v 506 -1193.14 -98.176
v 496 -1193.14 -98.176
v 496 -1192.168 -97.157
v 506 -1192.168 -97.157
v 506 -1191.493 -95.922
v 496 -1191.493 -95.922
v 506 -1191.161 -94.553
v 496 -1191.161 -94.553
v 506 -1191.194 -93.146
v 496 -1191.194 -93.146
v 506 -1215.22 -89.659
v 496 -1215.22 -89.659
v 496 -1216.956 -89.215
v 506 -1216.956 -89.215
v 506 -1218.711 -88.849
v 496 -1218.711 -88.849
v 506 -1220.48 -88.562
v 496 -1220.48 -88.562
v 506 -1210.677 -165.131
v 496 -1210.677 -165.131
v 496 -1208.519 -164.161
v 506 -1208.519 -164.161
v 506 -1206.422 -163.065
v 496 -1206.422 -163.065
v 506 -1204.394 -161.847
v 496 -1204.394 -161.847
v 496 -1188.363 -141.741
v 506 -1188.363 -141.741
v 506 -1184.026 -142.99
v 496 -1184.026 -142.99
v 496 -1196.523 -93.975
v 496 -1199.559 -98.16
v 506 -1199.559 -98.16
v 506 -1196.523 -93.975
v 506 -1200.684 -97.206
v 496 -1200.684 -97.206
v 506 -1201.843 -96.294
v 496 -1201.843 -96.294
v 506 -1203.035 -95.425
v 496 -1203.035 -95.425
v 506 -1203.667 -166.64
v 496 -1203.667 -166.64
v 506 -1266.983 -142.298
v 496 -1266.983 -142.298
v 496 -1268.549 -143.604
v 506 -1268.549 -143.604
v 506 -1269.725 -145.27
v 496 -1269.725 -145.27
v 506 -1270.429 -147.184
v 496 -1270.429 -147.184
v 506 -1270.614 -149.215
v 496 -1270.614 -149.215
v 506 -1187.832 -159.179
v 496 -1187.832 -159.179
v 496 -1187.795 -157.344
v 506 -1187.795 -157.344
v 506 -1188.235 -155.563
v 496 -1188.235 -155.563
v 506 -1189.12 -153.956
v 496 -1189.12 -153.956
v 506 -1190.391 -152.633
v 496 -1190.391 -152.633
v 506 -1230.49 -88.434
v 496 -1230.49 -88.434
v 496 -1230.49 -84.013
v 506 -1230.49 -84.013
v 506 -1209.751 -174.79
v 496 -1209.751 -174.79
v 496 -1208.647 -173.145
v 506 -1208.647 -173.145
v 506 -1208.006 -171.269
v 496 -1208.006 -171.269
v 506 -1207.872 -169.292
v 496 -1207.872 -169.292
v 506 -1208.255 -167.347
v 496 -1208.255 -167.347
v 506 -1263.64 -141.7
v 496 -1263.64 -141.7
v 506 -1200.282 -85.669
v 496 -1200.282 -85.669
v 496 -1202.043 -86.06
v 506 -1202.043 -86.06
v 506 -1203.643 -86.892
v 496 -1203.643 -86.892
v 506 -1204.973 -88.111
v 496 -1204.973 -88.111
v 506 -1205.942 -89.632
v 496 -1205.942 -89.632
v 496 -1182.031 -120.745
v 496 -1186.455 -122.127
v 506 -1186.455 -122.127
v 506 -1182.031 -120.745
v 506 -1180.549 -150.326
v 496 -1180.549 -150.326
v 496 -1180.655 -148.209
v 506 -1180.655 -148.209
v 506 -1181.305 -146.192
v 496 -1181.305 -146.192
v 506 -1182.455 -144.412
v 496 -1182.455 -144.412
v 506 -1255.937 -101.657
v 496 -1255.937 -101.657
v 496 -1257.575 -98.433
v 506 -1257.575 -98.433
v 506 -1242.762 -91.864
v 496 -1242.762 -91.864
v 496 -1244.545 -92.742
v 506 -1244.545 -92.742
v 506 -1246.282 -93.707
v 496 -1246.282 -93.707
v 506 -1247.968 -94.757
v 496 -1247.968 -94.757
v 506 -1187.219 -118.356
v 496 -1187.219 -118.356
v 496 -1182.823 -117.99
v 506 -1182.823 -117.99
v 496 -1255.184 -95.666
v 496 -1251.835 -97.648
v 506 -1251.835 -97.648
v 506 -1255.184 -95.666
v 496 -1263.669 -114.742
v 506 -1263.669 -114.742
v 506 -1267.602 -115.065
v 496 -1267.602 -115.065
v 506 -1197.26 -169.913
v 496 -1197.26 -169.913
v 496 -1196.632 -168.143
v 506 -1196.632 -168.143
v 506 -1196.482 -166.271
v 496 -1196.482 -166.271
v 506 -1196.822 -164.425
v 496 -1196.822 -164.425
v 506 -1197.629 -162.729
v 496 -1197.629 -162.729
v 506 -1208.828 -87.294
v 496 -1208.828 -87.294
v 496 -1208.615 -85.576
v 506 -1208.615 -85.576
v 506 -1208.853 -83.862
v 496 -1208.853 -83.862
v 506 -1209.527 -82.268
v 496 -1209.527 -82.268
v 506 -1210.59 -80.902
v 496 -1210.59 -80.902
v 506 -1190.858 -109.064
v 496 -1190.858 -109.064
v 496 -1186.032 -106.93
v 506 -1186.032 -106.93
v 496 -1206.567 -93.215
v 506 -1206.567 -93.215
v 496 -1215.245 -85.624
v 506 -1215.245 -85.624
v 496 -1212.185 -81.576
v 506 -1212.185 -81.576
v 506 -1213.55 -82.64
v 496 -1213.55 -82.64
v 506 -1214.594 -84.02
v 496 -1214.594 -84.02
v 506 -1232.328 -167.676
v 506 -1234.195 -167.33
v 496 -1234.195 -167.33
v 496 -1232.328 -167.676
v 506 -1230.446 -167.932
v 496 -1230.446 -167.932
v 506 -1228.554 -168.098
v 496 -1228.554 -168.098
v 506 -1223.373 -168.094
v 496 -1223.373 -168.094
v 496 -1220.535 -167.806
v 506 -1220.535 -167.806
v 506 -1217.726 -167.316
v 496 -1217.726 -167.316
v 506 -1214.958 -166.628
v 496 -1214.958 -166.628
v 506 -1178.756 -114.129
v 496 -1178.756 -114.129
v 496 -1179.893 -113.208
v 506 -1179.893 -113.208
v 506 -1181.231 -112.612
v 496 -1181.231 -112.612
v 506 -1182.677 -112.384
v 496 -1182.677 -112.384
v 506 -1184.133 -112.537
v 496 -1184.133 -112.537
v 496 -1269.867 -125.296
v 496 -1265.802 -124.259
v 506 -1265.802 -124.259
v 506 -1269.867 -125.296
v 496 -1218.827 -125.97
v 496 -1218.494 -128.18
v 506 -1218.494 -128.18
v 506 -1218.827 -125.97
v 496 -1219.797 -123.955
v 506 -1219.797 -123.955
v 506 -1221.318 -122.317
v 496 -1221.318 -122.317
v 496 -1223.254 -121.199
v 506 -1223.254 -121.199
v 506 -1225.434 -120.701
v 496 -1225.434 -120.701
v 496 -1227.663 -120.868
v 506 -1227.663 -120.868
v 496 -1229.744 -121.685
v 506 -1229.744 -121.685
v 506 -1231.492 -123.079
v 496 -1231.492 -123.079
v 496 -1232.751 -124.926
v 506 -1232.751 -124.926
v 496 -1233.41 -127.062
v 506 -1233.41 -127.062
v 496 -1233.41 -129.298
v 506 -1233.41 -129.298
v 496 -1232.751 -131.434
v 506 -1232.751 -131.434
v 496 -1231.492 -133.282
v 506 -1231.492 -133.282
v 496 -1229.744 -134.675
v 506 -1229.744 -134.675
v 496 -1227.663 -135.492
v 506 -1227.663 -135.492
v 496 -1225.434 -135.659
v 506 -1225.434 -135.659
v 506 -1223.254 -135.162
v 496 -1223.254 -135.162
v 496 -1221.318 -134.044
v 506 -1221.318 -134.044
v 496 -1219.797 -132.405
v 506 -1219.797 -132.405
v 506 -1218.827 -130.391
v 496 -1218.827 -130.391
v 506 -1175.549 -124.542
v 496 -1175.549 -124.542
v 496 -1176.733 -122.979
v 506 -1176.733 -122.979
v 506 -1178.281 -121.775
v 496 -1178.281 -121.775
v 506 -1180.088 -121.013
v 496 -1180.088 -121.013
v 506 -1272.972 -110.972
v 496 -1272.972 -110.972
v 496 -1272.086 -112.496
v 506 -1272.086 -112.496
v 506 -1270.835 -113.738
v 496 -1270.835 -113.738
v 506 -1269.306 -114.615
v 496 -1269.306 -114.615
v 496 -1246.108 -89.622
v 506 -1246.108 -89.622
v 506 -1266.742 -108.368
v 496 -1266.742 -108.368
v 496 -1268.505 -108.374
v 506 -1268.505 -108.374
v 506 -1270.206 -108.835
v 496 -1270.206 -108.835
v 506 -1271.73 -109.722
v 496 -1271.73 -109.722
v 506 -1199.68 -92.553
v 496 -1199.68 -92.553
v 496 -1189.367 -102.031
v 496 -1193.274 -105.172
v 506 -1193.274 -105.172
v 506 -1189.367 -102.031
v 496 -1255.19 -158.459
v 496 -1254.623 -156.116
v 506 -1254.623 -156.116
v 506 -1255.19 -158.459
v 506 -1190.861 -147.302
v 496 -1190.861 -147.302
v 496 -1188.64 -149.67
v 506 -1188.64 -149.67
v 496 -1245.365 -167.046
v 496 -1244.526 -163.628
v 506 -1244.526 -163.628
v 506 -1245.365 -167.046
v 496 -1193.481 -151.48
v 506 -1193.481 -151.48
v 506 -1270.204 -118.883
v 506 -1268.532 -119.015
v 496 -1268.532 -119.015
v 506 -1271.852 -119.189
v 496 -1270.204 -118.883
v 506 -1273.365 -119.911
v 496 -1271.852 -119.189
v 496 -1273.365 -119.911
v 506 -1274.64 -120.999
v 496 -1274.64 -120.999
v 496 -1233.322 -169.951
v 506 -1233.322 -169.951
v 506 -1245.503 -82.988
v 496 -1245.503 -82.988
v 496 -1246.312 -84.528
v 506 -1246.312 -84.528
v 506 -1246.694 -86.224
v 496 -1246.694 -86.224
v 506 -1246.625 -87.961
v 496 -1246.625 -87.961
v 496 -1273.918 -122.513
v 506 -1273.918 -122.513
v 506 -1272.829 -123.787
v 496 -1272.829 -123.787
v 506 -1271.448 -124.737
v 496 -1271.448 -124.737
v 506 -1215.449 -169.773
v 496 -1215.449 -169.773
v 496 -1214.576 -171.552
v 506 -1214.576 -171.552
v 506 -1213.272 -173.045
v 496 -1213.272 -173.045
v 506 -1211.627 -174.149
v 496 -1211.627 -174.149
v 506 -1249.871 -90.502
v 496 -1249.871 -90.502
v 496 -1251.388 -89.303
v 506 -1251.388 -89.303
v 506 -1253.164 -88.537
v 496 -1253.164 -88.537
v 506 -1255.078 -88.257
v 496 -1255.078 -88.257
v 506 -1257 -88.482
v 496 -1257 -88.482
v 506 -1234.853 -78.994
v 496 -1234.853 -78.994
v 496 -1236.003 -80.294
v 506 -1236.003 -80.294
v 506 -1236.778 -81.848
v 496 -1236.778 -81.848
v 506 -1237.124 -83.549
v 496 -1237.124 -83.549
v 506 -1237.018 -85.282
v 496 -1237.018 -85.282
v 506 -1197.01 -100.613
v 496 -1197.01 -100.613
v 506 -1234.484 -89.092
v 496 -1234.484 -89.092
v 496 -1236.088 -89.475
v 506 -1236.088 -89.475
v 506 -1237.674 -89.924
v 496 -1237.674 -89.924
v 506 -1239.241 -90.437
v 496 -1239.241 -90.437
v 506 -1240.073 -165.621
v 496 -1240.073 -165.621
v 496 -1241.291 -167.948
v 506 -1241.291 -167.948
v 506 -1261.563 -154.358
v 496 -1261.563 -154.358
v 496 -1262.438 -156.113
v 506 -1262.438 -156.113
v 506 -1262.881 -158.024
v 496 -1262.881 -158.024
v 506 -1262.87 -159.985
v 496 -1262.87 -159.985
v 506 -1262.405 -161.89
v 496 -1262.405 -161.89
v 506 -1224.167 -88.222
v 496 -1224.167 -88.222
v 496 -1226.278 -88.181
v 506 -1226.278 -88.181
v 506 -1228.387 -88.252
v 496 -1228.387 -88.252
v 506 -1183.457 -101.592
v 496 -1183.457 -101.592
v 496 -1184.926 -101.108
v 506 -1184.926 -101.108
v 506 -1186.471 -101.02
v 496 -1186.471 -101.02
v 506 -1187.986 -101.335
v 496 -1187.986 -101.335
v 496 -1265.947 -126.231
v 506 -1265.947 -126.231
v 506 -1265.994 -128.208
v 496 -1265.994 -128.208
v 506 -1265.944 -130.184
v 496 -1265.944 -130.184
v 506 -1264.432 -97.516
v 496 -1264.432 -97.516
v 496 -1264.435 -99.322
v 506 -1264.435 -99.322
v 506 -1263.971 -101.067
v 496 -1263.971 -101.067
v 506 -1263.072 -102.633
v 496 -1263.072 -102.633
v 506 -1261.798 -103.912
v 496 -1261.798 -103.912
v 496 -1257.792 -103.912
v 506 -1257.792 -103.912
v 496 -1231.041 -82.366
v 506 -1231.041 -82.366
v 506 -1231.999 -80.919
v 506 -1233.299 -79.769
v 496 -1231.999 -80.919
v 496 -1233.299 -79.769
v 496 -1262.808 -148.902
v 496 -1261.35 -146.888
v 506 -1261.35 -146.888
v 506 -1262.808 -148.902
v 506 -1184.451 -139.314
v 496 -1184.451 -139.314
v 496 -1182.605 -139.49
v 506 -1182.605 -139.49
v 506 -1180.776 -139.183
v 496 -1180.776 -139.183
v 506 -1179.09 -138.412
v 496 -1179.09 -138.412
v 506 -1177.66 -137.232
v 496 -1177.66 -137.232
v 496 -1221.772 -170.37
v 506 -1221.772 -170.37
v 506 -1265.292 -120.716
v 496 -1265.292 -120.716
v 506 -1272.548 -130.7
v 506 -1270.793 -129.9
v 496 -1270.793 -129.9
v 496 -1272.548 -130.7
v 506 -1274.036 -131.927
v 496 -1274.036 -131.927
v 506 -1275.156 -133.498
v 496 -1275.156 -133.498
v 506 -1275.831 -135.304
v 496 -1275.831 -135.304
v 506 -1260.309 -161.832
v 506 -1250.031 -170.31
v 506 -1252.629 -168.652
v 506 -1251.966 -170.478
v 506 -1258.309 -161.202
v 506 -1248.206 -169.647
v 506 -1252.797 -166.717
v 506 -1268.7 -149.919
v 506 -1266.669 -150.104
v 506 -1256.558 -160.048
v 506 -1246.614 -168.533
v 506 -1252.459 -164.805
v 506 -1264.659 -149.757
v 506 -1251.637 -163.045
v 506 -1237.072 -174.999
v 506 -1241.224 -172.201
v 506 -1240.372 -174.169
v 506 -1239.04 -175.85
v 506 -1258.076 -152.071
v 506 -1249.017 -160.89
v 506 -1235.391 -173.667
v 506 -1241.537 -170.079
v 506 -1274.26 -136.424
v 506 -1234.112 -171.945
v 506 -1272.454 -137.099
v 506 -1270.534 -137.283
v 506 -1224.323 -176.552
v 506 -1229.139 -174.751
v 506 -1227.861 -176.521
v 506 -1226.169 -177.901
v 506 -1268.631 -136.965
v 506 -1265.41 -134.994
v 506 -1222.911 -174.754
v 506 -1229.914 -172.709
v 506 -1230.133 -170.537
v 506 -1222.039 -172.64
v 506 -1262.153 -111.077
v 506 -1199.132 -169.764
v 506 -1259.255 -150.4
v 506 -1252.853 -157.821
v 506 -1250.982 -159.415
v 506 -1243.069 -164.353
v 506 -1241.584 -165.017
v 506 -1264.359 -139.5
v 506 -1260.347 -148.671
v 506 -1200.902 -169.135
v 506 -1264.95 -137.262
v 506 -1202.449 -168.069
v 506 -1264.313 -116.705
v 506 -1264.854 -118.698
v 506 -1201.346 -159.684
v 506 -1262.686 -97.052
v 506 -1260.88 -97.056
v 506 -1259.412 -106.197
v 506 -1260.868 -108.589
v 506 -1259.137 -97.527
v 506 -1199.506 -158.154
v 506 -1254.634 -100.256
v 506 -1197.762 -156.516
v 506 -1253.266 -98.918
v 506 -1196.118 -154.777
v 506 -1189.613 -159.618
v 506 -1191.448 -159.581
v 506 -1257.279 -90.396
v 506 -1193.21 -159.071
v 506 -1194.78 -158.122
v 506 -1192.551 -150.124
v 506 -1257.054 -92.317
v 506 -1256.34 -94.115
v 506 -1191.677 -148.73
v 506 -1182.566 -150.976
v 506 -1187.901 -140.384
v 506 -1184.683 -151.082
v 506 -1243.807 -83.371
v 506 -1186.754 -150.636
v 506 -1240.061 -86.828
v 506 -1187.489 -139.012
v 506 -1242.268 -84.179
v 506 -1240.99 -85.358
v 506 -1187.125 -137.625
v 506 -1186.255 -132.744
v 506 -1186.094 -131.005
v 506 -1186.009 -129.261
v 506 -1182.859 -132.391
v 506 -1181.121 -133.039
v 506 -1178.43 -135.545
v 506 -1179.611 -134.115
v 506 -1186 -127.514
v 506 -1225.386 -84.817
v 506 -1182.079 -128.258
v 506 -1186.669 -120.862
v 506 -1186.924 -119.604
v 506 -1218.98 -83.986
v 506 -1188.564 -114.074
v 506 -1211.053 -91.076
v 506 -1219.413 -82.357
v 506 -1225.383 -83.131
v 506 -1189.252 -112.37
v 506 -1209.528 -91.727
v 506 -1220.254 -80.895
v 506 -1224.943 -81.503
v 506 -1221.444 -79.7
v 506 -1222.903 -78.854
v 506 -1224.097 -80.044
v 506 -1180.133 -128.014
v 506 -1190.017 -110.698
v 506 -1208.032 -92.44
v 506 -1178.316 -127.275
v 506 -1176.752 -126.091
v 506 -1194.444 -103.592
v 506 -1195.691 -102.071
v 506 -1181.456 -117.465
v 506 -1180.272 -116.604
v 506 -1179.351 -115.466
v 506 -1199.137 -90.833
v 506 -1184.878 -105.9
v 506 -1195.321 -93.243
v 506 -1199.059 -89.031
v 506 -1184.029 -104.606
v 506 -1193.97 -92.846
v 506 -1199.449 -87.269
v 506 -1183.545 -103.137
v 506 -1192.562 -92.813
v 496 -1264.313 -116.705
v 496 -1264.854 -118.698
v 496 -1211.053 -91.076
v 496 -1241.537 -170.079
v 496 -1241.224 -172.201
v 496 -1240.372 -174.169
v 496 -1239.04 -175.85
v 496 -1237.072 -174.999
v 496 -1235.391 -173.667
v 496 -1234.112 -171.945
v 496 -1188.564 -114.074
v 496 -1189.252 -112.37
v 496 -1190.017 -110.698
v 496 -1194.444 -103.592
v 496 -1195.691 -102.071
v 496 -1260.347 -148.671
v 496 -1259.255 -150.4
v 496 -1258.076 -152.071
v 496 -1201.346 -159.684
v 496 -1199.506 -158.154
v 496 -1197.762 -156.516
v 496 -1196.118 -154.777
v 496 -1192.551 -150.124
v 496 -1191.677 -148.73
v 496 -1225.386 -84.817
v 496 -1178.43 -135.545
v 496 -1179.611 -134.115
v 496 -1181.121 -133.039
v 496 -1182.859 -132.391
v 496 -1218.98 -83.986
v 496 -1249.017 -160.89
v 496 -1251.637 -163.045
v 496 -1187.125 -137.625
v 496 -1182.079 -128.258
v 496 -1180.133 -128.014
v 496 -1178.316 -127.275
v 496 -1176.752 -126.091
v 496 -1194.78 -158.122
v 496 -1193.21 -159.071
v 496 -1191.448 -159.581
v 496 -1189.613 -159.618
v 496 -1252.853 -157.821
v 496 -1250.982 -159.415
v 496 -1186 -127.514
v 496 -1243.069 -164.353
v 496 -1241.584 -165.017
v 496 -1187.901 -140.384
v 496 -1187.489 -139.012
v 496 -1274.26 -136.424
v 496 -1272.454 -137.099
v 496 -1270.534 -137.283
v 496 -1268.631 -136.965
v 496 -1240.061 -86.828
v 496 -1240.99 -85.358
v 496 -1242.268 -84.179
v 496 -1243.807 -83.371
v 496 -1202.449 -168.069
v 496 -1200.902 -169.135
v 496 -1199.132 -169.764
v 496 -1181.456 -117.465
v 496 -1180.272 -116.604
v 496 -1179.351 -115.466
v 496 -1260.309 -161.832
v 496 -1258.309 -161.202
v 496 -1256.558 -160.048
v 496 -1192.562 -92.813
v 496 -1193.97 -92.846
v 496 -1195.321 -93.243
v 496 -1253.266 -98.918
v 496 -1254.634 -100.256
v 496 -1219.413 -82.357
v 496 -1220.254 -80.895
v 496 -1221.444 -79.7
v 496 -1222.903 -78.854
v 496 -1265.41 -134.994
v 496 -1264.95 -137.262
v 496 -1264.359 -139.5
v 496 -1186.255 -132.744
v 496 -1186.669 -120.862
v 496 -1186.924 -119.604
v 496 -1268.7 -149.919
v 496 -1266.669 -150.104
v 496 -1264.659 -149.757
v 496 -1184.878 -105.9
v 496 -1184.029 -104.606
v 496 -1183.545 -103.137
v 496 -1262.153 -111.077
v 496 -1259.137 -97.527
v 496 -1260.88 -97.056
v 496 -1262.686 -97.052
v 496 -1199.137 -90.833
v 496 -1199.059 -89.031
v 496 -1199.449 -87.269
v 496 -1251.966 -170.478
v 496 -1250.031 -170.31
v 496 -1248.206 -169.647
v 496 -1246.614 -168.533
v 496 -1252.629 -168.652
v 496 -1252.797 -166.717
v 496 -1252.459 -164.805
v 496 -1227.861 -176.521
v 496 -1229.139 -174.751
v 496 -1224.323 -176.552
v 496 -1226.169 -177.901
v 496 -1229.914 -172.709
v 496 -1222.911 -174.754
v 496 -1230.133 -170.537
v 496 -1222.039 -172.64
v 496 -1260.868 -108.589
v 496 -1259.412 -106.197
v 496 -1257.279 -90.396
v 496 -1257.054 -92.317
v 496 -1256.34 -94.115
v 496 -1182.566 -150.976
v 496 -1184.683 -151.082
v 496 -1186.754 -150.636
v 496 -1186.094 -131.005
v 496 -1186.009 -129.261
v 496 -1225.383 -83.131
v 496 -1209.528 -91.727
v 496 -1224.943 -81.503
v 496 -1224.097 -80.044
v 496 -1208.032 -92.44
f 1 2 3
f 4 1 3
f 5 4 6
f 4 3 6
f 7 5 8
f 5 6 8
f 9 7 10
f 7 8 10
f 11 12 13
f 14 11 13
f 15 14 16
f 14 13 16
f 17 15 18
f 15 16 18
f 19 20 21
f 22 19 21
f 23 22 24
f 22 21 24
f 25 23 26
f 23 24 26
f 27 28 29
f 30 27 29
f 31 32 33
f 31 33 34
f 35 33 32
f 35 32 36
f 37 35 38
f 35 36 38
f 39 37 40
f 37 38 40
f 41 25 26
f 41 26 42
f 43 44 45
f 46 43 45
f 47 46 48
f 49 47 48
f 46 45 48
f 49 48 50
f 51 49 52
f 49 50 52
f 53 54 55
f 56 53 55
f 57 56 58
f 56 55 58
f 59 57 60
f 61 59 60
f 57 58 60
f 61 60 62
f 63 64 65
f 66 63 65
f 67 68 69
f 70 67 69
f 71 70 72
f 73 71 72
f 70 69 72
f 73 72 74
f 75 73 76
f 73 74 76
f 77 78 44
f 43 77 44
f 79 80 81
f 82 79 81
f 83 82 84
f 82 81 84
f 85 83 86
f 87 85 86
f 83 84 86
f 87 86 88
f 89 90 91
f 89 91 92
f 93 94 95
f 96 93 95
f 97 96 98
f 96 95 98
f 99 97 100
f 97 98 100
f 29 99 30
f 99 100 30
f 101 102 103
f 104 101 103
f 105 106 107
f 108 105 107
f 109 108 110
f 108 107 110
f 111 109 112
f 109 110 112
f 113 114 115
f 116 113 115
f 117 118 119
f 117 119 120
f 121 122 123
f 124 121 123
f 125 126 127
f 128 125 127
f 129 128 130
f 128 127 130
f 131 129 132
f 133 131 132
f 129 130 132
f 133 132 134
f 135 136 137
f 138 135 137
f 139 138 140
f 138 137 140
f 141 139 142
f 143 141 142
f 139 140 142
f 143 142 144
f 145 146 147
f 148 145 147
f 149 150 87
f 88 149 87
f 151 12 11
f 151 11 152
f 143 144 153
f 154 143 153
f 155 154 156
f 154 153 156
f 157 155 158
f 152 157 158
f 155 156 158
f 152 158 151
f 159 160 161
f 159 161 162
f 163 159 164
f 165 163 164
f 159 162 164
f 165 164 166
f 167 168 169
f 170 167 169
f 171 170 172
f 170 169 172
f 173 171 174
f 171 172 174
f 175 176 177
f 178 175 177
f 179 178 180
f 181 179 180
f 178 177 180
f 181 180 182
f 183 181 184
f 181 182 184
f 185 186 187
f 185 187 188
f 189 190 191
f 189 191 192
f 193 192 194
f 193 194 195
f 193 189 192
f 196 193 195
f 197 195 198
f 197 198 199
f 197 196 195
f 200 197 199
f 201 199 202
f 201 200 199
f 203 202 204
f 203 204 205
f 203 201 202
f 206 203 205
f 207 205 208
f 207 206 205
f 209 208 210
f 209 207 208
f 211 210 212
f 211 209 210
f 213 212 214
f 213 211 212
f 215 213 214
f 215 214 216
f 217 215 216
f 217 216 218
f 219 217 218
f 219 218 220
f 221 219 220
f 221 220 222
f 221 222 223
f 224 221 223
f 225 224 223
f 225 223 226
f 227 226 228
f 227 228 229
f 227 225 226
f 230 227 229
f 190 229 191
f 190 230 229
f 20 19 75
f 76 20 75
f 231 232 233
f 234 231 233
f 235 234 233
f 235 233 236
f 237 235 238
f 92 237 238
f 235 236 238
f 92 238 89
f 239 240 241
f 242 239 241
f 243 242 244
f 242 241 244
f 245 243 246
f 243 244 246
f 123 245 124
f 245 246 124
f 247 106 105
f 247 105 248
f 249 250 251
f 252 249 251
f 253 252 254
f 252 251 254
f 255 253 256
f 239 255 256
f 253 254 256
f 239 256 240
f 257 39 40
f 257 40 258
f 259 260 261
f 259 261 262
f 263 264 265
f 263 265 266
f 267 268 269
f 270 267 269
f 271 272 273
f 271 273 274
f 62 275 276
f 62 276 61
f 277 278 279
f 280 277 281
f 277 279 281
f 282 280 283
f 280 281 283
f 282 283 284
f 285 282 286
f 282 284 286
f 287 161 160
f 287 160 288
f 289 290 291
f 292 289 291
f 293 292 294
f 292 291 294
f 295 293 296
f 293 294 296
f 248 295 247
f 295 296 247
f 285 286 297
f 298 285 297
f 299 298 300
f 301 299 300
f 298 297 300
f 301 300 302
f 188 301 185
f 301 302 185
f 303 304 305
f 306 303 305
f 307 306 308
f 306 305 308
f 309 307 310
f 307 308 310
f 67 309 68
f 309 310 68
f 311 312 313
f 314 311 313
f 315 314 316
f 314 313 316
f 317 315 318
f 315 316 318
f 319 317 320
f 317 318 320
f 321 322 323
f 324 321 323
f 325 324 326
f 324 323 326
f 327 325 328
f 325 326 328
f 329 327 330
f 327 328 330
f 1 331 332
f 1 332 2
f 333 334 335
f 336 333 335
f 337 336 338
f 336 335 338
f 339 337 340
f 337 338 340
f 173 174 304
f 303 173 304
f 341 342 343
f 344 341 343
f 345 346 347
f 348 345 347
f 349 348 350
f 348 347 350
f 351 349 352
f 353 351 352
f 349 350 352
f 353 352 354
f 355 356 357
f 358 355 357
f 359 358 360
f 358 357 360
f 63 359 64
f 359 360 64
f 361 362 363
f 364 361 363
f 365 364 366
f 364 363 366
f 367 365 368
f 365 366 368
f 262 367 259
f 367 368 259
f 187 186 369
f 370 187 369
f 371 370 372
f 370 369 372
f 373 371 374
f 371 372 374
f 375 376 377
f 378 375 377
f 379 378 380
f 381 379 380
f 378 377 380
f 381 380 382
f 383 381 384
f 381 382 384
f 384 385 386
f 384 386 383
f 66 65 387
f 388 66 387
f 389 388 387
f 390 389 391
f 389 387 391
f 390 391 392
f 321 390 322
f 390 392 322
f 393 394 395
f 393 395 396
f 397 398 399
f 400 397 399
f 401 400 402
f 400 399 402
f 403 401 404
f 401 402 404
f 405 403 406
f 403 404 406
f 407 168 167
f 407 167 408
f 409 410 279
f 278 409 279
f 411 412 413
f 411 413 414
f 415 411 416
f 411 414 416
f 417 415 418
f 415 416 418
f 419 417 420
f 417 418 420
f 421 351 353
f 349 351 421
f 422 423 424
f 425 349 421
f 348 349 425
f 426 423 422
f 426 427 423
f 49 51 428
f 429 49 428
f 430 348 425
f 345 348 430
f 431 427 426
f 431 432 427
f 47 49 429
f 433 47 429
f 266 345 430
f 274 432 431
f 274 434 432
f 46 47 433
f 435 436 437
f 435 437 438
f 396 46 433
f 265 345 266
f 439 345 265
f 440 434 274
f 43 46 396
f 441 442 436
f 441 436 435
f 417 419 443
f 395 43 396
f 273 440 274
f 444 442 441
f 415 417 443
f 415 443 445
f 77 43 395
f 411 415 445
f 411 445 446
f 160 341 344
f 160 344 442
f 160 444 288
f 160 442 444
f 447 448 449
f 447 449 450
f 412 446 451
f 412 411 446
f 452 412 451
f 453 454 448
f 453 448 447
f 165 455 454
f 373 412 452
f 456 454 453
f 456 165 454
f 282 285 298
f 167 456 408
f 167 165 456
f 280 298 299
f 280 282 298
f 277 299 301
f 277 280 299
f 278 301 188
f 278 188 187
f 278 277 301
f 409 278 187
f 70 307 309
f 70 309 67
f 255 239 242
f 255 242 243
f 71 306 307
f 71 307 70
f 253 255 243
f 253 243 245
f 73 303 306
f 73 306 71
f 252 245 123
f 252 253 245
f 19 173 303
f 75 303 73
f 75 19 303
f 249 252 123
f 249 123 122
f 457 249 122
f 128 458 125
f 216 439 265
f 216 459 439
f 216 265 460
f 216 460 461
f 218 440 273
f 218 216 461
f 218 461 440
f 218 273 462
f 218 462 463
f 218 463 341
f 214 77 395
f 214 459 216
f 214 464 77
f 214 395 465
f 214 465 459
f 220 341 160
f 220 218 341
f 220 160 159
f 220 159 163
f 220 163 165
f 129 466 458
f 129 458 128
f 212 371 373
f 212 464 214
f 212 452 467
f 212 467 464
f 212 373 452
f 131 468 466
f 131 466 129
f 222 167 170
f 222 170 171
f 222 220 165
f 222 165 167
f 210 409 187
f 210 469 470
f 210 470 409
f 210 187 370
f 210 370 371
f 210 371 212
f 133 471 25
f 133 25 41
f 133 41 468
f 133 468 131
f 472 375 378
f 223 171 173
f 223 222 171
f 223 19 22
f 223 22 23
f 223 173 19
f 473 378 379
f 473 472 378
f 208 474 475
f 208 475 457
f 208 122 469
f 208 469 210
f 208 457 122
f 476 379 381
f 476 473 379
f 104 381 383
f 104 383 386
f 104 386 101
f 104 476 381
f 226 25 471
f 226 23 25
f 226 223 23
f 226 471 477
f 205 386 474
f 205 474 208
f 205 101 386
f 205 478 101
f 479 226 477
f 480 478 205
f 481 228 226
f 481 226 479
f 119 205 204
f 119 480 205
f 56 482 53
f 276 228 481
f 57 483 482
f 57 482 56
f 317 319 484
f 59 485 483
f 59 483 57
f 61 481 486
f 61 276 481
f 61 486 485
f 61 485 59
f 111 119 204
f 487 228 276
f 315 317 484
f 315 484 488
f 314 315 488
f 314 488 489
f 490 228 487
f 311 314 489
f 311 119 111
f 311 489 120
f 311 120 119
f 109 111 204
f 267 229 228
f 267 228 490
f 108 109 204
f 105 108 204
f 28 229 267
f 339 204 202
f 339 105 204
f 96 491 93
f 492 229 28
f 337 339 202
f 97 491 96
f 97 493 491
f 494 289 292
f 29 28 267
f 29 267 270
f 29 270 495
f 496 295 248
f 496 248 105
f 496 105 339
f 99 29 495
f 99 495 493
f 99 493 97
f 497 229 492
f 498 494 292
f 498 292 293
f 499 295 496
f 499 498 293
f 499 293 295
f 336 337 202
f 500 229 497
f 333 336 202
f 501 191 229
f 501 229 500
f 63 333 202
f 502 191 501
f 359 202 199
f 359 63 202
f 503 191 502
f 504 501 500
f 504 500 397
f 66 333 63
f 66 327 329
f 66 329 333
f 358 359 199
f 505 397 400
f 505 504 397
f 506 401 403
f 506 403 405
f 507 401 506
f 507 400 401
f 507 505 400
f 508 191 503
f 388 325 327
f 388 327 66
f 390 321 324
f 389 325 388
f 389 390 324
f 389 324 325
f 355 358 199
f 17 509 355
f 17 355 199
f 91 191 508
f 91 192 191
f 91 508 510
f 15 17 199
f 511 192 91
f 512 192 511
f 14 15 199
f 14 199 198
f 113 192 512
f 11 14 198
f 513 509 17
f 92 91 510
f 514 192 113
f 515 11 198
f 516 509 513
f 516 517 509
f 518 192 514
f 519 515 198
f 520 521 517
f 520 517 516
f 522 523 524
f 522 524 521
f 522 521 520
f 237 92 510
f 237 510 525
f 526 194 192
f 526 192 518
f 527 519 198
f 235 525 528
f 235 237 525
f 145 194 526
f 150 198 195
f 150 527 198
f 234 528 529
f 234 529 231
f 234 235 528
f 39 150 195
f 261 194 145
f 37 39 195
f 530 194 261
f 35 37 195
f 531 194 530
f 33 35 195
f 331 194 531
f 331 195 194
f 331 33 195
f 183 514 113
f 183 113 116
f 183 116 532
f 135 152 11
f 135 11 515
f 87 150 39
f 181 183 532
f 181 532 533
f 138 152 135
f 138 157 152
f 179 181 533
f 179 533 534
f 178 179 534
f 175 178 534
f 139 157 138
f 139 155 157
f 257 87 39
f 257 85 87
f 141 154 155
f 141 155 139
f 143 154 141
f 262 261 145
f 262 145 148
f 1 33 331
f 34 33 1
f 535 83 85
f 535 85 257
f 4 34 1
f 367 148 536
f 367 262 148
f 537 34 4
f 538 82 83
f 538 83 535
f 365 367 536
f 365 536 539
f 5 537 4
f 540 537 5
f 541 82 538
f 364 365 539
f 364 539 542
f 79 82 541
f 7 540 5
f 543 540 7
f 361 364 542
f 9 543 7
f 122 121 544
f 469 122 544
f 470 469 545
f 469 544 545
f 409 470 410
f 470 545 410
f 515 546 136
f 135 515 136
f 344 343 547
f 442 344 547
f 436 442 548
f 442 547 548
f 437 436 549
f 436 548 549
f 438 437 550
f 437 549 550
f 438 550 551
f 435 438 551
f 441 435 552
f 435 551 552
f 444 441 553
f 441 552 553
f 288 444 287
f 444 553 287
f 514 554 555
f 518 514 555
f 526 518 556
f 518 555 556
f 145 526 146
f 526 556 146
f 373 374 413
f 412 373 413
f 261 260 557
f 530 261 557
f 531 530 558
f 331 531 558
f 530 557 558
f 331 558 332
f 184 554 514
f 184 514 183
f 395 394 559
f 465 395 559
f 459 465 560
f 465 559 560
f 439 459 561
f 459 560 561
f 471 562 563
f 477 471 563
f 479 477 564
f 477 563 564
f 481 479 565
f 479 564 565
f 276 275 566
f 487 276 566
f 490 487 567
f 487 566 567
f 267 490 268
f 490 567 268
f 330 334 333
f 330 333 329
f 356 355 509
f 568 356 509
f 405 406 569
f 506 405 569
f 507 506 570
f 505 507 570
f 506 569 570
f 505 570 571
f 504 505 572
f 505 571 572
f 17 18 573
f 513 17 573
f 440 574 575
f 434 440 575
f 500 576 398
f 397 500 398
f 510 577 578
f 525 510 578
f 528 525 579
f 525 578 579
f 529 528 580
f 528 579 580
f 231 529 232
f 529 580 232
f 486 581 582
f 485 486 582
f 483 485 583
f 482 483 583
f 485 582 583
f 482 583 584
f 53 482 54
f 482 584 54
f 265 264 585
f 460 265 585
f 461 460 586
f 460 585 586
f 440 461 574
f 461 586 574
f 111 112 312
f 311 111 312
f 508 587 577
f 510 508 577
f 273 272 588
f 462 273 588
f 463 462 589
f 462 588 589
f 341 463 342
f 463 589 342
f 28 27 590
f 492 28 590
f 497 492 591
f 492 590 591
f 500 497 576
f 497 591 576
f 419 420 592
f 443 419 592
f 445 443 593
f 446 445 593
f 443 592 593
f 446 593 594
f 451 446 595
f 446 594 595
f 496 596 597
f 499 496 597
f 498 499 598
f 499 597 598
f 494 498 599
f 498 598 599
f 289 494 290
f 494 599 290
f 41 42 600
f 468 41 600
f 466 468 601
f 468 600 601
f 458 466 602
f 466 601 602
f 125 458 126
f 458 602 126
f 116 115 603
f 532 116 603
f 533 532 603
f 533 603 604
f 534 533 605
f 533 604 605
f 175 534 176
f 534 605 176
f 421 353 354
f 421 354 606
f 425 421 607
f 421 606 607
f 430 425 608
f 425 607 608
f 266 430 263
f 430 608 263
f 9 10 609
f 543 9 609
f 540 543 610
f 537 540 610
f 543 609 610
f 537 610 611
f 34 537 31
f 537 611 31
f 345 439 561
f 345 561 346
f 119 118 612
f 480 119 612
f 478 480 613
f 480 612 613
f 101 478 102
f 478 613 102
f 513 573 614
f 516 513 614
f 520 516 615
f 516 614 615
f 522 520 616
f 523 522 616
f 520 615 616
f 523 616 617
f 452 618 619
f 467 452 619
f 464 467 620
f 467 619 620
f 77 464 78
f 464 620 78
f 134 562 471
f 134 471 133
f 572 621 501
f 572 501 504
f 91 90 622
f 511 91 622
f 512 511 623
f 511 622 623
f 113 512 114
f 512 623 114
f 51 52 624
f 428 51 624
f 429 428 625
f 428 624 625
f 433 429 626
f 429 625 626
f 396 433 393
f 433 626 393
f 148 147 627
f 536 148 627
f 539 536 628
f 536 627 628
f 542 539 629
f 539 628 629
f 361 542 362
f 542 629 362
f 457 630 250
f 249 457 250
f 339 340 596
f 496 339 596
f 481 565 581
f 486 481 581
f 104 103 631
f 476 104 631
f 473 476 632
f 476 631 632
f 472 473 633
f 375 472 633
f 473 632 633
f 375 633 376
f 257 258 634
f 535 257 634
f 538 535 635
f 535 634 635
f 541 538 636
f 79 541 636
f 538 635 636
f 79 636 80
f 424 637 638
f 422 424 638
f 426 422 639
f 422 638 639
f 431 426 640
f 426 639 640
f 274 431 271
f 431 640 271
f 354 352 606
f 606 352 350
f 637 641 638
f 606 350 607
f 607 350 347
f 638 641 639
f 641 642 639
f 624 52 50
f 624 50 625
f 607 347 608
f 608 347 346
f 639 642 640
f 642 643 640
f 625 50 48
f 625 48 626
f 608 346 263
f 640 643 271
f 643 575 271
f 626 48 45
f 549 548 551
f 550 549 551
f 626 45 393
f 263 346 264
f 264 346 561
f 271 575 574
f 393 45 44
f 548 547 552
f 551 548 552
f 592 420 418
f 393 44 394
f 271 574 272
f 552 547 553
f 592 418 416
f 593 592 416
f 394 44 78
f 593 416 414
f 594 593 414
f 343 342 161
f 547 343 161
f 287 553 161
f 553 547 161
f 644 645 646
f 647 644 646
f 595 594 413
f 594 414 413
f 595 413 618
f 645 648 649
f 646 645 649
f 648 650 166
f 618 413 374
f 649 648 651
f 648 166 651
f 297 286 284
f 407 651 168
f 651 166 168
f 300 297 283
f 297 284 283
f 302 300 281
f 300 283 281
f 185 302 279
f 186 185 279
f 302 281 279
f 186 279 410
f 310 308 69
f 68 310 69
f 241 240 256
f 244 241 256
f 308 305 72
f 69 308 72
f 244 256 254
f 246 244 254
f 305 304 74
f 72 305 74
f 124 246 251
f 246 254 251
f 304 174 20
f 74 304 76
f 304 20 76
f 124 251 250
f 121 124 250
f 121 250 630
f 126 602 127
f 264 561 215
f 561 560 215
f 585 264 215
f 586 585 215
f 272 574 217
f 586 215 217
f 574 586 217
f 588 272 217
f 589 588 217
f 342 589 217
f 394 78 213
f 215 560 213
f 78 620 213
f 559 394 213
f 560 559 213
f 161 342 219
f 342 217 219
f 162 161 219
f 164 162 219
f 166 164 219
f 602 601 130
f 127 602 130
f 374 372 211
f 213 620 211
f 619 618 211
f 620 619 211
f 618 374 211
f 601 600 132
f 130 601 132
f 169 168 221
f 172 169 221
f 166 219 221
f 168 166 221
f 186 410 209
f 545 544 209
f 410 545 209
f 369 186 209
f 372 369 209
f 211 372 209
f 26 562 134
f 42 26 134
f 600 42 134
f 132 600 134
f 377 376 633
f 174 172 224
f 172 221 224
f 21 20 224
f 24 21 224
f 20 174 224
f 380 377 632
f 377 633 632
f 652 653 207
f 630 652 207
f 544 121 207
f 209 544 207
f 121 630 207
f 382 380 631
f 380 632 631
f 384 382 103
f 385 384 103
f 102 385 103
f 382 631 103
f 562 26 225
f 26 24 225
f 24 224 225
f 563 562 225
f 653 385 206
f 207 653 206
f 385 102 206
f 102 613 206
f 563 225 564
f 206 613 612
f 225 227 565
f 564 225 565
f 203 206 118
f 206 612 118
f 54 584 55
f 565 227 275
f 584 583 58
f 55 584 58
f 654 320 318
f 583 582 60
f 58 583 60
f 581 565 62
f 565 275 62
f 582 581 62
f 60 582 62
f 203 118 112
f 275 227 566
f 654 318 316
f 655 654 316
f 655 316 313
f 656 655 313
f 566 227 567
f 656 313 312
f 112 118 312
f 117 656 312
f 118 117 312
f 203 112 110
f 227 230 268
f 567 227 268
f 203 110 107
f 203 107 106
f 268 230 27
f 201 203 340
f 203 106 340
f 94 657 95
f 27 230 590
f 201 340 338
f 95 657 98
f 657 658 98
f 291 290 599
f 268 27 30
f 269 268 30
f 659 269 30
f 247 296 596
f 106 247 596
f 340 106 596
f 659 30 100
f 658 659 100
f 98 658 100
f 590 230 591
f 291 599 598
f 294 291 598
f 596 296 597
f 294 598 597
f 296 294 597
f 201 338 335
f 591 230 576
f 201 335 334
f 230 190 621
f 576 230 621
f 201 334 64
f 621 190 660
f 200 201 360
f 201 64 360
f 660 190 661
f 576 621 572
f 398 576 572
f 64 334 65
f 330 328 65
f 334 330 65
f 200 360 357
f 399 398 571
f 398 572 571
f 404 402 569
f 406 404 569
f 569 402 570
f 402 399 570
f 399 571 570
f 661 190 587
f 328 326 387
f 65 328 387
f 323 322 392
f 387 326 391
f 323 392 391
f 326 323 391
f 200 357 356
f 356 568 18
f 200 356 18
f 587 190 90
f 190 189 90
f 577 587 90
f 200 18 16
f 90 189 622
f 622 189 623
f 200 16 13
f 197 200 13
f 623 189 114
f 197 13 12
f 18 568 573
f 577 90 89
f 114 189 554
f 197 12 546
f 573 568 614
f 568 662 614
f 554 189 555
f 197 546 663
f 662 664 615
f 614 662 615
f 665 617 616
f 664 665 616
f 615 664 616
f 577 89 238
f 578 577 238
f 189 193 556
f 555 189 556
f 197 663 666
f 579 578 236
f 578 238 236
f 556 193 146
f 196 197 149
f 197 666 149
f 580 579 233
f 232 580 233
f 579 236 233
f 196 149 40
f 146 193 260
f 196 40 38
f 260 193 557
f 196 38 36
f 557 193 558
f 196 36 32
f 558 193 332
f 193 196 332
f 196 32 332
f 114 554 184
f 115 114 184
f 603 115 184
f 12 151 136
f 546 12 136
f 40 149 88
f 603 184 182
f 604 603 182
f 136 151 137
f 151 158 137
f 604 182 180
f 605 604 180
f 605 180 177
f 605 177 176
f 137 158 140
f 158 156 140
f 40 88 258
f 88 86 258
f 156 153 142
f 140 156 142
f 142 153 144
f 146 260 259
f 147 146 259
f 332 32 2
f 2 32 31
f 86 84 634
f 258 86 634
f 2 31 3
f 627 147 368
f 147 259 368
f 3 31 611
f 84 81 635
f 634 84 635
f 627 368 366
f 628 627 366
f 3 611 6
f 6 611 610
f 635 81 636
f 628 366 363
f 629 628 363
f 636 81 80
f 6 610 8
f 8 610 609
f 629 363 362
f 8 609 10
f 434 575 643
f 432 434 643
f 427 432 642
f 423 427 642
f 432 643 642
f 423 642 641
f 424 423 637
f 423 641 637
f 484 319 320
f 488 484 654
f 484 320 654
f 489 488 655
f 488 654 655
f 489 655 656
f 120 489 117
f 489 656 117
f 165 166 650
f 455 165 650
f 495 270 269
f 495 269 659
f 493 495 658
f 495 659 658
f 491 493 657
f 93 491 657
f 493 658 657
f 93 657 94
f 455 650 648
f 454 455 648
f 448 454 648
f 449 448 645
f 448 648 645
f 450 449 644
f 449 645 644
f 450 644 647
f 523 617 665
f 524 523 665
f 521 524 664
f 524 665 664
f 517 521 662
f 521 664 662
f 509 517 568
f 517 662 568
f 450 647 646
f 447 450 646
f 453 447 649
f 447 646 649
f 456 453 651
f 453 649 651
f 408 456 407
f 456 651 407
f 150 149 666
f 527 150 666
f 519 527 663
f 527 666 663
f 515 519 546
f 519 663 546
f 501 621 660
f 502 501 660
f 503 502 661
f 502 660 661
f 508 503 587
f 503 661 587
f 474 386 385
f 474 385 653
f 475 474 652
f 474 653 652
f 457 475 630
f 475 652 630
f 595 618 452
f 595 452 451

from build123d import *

# Parameters (mm, degrees)
SKETCH002_R  = 7.5
PAD001_DEPTH = 10


with BuildPart() as part:
    # Sketch002 → Pad001 (new body)
    with BuildSketch(Plane.YZ):
        with BuildLine():
            ThreePointArc((-7.372881, -40.094264), (-3.126041, -39.586192), (1.04227, -38.627568))
            Line((1.04227, -38.627568), (0.551182, -41.772804))
            ThreePointArc((0.551182, -41.772804), (2.72771, -45.044909), (6.248691, -46.790371))
            ThreePointArc((6.248691, -46.790371), (7.994153, -43.26939), (7.745277, -39.3474))
            Line((5.322974, -37.131356), (7.745277, -39.3474))
            ThreePointArc((5.322974, -37.131356), (8.537274, -35.628587), (11.605754, -33.846883))
            Line((11.605754, -33.846883), (12.333348, -38.63991))
            ThreePointArc((12.333348, -38.63991), (15.097939, -41.134767), (18.739574, -41.913081))
            ThreePointArc((18.739574, -41.913081), (19.517888, -38.271446), (18.37111, -34.728541))
            Line((14.654104, -31.683604), (18.37111, -34.728541))
            ThreePointArc((14.654104, -31.683604), (17.378229, -29.347876), (19.882066, -26.777412))
            Line((19.882066, -26.777412), (21.219608, -30.122295))
            ThreePointArc((21.219608, -30.122295), (24.552318, -31.581454), (28.168109, -31.178768))
            ThreePointArc((28.168109, -31.178768), (27.765423, -27.562977), (25.608791, -24.632953))
            Line((22.518982, -23.480322), (25.608791, -24.632953))
            ThreePointArc((22.518982, -23.480322), (23.893543, -21.431633), (25.139192, -19.302101))
            Line((25.139192, -19.302101), (27.359533, -21.66958))
            ThreePointArc((27.359533, -21.66958), (31.317426, -23.081877), (35.451211, -22.326017))
            ThreePointArc((35.451211, -22.326017), (34.69535, -18.192232), (31.973863, -14.9902))
            Line((27.63708, -13.740754), (31.973863, -14.9902))
            ThreePointArc((27.63708, -13.740754), (28.311222, -11.699588), (28.874738, -9.625154))
            Line((28.874738, -9.625154), (31.548764, -11.314179))
            ThreePointArc((31.548764, -11.314179), (35.22362, -11.182883), (38.340491, -9.231748))
            ThreePointArc((38.340491, -9.231748), (36.389357, -6.114877), (33.141189, -4.391155))
            Line((29.744589, -4.744157), (33.141189, -4.391155))
            ThreePointArc((29.744589, -4.744157), (29.958098, -2.133322), (30.00026, 0.485889))
            Line((30.00026, 0.485889), (33.921496, -0.257635))
            ThreePointArc((33.921496, -0.257635), (37.68409, 0.725166), (40.451192, 3.457594))
            ThreePointArc((40.451192, 3.457594), (37.718763, 6.224696), (33.968861, 7.254862))
            Line((29.545098, 5.873223), (33.968861, 7.254862))
            ThreePointArc((29.545098, 5.873223), (29.208197, 7.767875), (28.780562, 9.644132))
            Line((28.780562, 9.644132), (33.177289, 10.00993))
            ThreePointArc((33.177289, 10.00993), (35.728214, 11.395702), (37.244494, 13.871278))
            ThreePointArc((37.244494, 13.871278), (34.768918, 15.387558), (31.866866, 15.462907))
            Line((27.436049, 13.925673), (31.866866, 15.462907))
            ThreePointArc((27.436049, 13.925673), (26.375433, 16.470589), (25.142027, 18.936397))
            Line((25.142027, 18.936397), (29.967849, 21.069522))
            ThreePointArc((29.967849, 21.069522), (31.970773, 23.393509), (32.543362, 26.407602))
            ThreePointArc((32.543362, 26.407602), (29.529269, 26.980191), (26.632693, 25.969022))
            Line((22.726486, 22.827517), (26.632693, 25.969022))
            ThreePointArc((22.726486, 22.827517), (20.942152, 25.176066), (18.98961, 27.386747))
            Line((18.98961, 27.386747), (22.859671, 29.824034))
            ThreePointArc((22.859671, 29.824034), (24.506903, 32.07831), (24.80631, 34.854187))
            ThreePointArc((24.80631, 34.854187), (22.030434, 35.153594), (19.476751, 34.02495))
            Line((16.440698, 29.839688), (19.476751, 34.02495))
            ThreePointArc((16.440698, 29.839688), (14.740616, 31.25523), (12.964876, 32.574618))
            Line((12.964876, 32.574618), (16.319999, 35.447081))
            ThreePointArc((16.319999, 35.447081), (16.941471, 38.969468), (15.718489, 42.330681))
            ThreePointArc((15.718489, 42.330681), (12.357276, 41.107698), (10.057871, 38.367958))
            Line((9.433448, 34.784975), (10.057871, 38.367958))
            ThreePointArc((9.433448, 34.784975), (7.223624, 35.924417), (4.947279, 36.924367))
            Line((4.947279, 36.924367), (7.1719, 40.70615))
            ThreePointArc((7.1719, 40.70615), (7.147067, 44.138089), (5.409592, 47.097818))
            ThreePointArc((5.409592, 47.097818), (2.449862, 45.360343), (0.755399, 42.37578))
            Line((0.780338, 38.341298), (0.755399, 42.37578))
            ThreePointArc((0.780338, 38.341298), (-1.831547, 38.978037), (-4.480302, 39.437893))
            Line((-4.480302, 39.437893), (-2.979924, 44.013792))
            ThreePointArc((-2.979924, 44.013792), (-4.253731, 47.105339), (-6.902654, 49.145794))
            ThreePointArc((-6.902654, 49.145794), (-8.943109, 46.496871), (-9.385733, 43.182609))
            Line((-8.16746, 39.778019), (-9.385733, 43.182609))
            ThreePointArc((-8.16746, 39.778019), (-11.333059, 39.797339), (-14.490272, 39.566265))
            Line((-14.490272, 39.566265), (-14.490272, 43.98748))
            ThreePointArc((-14.490272, 43.98748), (-15.999307, 47.081093), (-18.852977, 49.005722))
            ThreePointArc((-18.852977, 49.005722), (-20.777606, 46.152053), (-21.01755, 42.718388))
            Line((-18.483952, 38.908421), (-21.01755, 42.718388))
            ThreePointArc((-18.483952, 38.908421), (-20.883273, 38.309075), (-23.240971, 37.562604))
            Line((-23.240971, 37.562604), (-24.06091, 41.171638))
            ThreePointArc((-24.06091, 41.171638), (-26.267629, 43.82088), (-29.503325, 45.011832))
            ThreePointArc((-29.503325, 45.011832), (-30.694276, 41.776136), (-30.107822, 38.378465))
            Line((-26.761898, 36.135645), (-30.107822, 38.378465))
            ThreePointArc((-26.761898, 36.135645), (-29.419041, 34.786526), (-31.968369, 33.24333))
            Line((-31.968369, 33.24333), (-33.870535, 37.498149))
            ThreePointArc((-33.870535, 37.498149), (-37.164485, 39.463014), (-40.999563, 39.517661))
            ThreePointArc((-40.999563, 39.517661), (-41.05421, 35.682584), (-39.183997, 32.333986))
            Line((-35.835479, 30.35216), (-39.183997, 32.333986))
            ThreePointArc((-35.835479, 30.35216), (-37.957964, 28.420932), (-39.93653, 26.342505))
            Line((-39.93653, 26.342505), (-41.575001, 29.566843))
            ThreePointArc((-41.575001, 29.566843), (-44.88038, 30.944013), (-48.431509, 30.483987))
            ThreePointArc((-48.431509, 30.483987), (-47.971483, 26.932859), (-45.797525, 24.087505))
            Line((-41.791617, 24.087505), (-45.797525, 24.087505))
            ThreePointArc((-41.791617, 24.087505), (-44.160781, 20.619854), (-46.153311, 16.922914))
            Line((-46.153311, 16.922914), (-50.742028, 19.632063))
            ThreePointArc((-50.742028, 19.632063), (-54.205982, 19.16463), (-56.972138, 17.027844))
            ThreePointArc((-56.972138, 17.027844), (-54.835352, 14.261689), (-51.601763, 12.934521))
            Line((-47.669302, 13.257985), (-51.601763, 12.934521))
            ThreePointArc((-47.669302, 13.257985), (-48.596186, 10.30241), (-49.291589, 7.283975))
            Line((-49.291589, 7.283975), (-52.532451, 8.985395))
            ThreePointArc((-52.532451, 8.985395), (-55.852169, 8.811227), (-58.640045, 7.000533))
            ThreePointArc((-58.640045, 7.000533), (-56.829351, 4.212658), (-53.867307, 2.703633))
            Line((-49.801546, 3.740797), (-53.867307, 2.703633))
            ThreePointArc((-49.801546, 3.740797), (-49.982641, 0.781001), (-49.943969, -2.184078))
            Line((-49.943969, -2.184078), (-54.793138, -1.899745))
            ThreePointArc((-54.793138, -1.899745), (-58.035986, -3.927121), (-59.830686, -7.304304))
            ThreePointArc((-59.830686, -7.304304), (-56.453504, -9.099004), (-52.631427, -8.964669))
            Line((-49.409647, -6.993613), (-52.631427, -8.964669))
            ThreePointArc((-49.409647, -6.993613), (-48.670532, -10.385186), (-47.640158, -13.69991))
            Line((-47.640158, -13.69991), (-50.982572, -14.298306))
            ThreePointArc((-50.982572, -14.298306), (-53.725014, -17.270261), (-54.614061, -21.21527))
            ThreePointArc((-54.614061, -21.21527), (-50.669052, -22.104317), (-46.808051, -20.90175))
            Line((-45.349568, -18.888466), (-46.808051, -20.90175))
            ThreePointArc((-45.349568, -18.888466), (-43.812217, -21.542392), (-42.076041, -24.070726))
            Line((-42.076041, -24.070726), (-45.563033, -26.35824))
            ThreePointArc((-45.563033, -26.35824), (-46.88137, -30.023623), (-46.405266, -33.889676))
            ThreePointArc((-46.405266, -33.889676), (-42.308675, -33.202292), (-39.189808, -30.458714))
            Line((-38.622542, -28.116203), (-39.189808, -30.458714))
            ThreePointArc((-38.622542, -28.116203), (-35.930016, -30.632391), (-33.017345, -32.8901))
            Line((-33.017345, -32.8901), (-35.637207, -35.045193))
            ThreePointArc((-35.637207, -35.045193), (-36.797466, -38.717464), (-35.966145, -42.477874))
            ThreePointArc((-35.966145, -42.477874), (-32.205735, -41.646553), (-29.364786, -39.046402))
            Line((-28.526262, -35.628271), (-29.364786, -39.046402))
            ThreePointArc((-28.526262, -35.628271), (-26.329852, -36.692522), (-24.072624, -37.620837))
            Line((-24.072624, -37.620837), (-25.290637, -39.948337))
            ThreePointArc((-25.290637, -39.948337), (-25.224166, -44.200892), (-23.040323, -47.850478))
            ThreePointArc((-23.040323, -47.850478), (-19.390737, -45.666635), (-17.322024, -41.950579))
            Line((-18.195367, -39.33048), (-17.322024, -41.950579))
            ThreePointArc((-18.195367, -39.33048), (-15.388372, -39.814864), (-12.554022, -40.098254))
            Line((-12.554022, -40.098254), (-14.133284, -42.536876))
            ThreePointArc((-14.133284, -42.536876), (-13.138594, -46.750559), (-10.168772, -49.900906))
            ThreePointArc((-10.168772, -49.900906), (-6.910841, -46.753818), (-5.771565, -42.36972))
            Line((-7.372881, -40.094264), (-5.771565, -42.36972))
        make_face()
        with Locations((-9.994192, -0.180247)):
            Circle(SKETCH002_R, mode=Mode.SUBTRACT)
    extrude(amount=PAD001_DEPTH)


with BuildPart() as part_1:
    # Body001 placement: moved
    add(part.part.moved(Location((496, -1216, -128))))


solid = part_1.part
